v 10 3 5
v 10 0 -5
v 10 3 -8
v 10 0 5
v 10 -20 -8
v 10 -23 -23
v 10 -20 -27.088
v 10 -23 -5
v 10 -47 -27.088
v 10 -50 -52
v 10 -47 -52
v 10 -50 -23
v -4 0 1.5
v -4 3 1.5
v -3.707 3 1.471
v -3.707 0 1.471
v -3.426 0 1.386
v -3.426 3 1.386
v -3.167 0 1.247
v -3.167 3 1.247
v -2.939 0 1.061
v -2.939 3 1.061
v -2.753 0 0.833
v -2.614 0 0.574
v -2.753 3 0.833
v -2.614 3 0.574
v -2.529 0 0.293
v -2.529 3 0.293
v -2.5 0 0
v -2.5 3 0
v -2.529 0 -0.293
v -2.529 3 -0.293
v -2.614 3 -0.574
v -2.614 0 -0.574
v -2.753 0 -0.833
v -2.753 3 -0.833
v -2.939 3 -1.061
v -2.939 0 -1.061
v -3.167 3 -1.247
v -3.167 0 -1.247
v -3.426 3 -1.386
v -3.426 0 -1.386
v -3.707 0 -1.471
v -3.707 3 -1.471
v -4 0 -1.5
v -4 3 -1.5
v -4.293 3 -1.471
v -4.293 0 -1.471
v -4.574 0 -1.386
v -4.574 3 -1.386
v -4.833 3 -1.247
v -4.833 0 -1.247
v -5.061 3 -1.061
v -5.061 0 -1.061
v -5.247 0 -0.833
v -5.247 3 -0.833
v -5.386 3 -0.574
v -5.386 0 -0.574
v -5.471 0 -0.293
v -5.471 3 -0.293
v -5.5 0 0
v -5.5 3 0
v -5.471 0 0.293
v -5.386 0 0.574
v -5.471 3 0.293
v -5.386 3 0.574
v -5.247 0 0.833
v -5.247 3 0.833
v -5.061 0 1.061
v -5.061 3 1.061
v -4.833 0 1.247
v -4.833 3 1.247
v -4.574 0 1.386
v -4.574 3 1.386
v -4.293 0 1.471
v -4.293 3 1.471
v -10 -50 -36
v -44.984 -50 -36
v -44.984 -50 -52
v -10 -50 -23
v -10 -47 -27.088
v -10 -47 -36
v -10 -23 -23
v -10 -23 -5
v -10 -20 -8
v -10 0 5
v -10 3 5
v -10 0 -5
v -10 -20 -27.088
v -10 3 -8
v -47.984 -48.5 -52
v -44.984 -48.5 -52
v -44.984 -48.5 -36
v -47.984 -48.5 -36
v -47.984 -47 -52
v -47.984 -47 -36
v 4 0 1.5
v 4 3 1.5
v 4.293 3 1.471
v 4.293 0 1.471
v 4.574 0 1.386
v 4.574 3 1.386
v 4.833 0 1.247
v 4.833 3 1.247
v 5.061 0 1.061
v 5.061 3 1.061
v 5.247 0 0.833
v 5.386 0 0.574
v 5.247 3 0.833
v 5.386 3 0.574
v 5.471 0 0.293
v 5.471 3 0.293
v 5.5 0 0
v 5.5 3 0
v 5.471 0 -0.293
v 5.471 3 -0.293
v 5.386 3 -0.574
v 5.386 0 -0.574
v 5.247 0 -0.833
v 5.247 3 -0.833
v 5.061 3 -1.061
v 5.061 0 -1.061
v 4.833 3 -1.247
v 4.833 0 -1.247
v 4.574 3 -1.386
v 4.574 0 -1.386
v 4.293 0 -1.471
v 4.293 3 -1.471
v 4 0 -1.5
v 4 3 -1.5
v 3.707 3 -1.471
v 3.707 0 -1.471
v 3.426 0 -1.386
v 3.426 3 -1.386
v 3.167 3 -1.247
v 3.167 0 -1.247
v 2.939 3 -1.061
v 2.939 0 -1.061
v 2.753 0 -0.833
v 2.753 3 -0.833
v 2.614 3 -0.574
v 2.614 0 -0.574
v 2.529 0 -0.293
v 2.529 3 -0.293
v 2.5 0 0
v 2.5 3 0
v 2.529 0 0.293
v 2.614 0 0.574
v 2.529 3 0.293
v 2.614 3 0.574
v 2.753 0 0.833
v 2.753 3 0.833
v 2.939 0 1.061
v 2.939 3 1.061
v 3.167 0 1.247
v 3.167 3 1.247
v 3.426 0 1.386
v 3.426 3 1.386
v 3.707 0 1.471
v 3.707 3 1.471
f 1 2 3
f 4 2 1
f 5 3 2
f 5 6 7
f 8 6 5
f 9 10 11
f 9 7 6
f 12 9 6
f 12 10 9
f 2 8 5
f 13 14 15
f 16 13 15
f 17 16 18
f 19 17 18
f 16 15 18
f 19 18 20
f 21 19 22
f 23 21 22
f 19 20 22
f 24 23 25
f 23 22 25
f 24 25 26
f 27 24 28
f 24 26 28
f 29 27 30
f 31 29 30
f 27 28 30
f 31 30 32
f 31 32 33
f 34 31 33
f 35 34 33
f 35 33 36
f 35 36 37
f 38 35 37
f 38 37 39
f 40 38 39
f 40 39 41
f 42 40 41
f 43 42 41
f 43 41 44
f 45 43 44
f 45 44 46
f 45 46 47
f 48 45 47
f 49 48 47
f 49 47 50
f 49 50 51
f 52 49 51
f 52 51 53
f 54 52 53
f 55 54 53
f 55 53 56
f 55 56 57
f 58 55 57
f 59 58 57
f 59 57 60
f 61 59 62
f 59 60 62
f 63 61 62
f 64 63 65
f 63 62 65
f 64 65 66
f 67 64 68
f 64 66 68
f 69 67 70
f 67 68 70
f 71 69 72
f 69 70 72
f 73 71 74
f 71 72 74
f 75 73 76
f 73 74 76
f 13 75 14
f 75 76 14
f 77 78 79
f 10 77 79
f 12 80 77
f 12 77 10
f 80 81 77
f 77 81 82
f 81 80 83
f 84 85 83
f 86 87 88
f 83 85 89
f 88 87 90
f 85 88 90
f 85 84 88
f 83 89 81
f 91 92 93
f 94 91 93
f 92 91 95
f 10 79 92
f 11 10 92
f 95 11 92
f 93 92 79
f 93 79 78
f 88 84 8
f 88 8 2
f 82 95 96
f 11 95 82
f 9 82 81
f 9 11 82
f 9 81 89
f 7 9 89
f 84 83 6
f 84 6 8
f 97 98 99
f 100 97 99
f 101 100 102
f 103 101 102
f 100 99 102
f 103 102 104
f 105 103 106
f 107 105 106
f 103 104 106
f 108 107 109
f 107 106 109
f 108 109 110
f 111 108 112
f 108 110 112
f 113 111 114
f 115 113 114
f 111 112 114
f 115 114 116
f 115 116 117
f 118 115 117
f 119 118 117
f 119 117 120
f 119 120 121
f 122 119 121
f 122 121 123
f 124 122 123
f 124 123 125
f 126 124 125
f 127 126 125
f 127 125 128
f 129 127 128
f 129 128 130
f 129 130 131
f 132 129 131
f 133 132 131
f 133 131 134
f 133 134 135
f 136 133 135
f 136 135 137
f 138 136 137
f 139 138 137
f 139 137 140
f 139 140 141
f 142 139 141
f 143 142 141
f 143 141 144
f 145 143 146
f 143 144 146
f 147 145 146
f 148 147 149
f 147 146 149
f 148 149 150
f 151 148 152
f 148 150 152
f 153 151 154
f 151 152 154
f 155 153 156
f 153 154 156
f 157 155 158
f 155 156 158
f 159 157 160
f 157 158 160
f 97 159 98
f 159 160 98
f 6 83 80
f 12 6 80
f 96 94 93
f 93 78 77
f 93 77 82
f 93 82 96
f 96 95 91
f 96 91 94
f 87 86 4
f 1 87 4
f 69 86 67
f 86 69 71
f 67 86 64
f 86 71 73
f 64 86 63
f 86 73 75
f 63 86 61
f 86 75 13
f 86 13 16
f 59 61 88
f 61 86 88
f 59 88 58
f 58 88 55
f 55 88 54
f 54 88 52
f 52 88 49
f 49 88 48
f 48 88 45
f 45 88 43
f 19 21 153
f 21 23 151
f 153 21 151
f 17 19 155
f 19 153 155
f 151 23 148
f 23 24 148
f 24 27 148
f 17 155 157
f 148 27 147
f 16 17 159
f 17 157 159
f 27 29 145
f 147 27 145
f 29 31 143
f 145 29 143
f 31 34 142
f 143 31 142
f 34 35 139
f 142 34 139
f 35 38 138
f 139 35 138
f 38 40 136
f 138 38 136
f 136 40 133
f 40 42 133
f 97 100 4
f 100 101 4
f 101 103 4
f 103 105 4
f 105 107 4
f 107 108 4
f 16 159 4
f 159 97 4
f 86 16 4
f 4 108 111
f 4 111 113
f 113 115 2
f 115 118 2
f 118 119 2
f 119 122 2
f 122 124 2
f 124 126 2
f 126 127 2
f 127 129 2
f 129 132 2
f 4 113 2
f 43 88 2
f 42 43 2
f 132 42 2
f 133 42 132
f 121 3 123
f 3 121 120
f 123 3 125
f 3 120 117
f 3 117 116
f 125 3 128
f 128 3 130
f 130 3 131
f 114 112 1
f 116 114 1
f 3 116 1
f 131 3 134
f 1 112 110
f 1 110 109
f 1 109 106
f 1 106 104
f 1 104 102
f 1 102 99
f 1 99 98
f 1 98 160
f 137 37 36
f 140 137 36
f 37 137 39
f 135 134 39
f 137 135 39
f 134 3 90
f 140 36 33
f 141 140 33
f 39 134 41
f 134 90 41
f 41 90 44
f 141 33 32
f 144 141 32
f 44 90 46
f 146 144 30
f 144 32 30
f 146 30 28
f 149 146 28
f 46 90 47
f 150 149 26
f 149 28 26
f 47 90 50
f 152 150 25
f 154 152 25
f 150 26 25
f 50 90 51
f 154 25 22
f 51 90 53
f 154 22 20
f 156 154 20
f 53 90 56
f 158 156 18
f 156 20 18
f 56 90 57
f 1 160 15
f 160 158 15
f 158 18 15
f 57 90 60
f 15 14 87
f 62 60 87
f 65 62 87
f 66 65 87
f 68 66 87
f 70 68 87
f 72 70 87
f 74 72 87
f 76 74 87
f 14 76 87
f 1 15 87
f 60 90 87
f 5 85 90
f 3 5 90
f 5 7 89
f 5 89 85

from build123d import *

# Parameters (mm, degrees)
SKETCH_1_W          = 20
SKETCH_1_H          = 10
EXTRUDE_1_DEPTH     = 3
EXTRUDE_4_DEPTH     = 20
CUT_EXTRUDE_1_REACH = 71.606
SKETCH_4_R          = 1.5
SKETCH_5_W          = 55.983974596
SKETCH_5_H          = 16
EXTRUDE_5_DEPTH     = 3
SKETCH_6_W          = 16
SKETCH_6_H          = 3
CUT_EXTRUDE_2_DEPTH = 1
SKETCH_7_W          = 16
SKETCH_7_H          = 1.5
EXTRUDE_6_DEPTH     = 3


with BuildPart() as part:
    # 草图1 → 凸台-拉伸1 (new body)
    with BuildSketch(Plane(origin=(0, 0, 0), x_dir=(1, 0, 0), z_dir=(0, 1, 0))):
        Rectangle(SKETCH_1_W, SKETCH_1_H)
    extrude(amount=EXTRUDE_1_DEPTH)

    # 草图2 → 凸台-拉伸4 (add)
    with BuildSketch(Plane.ZY.offset(10)):
        Polygon((-8, -20), (-8, 3), (-5, 3), (-5, 0), (-5, -23), (-8, -23), (-23, -23), (-23, -50), (-44, -50), (-44, -47), (-27.087778499, -47), (-27.087778499, -20), align=None)
    extrude(amount=-EXTRUDE_4_DEPTH)

    # 草图4 → 切除-拉伸1 (cut, up to next)
    with BuildSketch(Plane(origin=(0, 3, 0), x_dir=(1, 0, 0), z_dir=(0, 1, 0)), mode=Mode.PRIVATE) as cut_extrude_1_sk1:
        with Locations(Location((4, 0, 0), (0, 0, 270))):
            Circle(SKETCH_4_R)
    cut_extrude_1_tool1 = extrude(cut_extrude_1_sk1.sketch, amount=-CUT_EXTRUDE_1_REACH, mode=Mode.PRIVATE) & part.part
    # 草图4 → 切除-拉伸1 (cut, up to next)
    with BuildSketch(Plane(origin=(0, 3, 0), x_dir=(1, 0, 0), z_dir=(0, 1, 0)), mode=Mode.PRIVATE) as cut_extrude_1_sk2:
        with Locations(Location((-4, 0, 0), (0, 0, 270))):
            Circle(SKETCH_4_R)
    cut_extrude_1_tool2 = extrude(cut_extrude_1_sk2.sketch, amount=-CUT_EXTRUDE_1_REACH, mode=Mode.PRIVATE) & part.part
    add(cut_extrude_1_tool1.solids().sort_by_distance((4, 3, 0))[0], mode=Mode.SUBTRACT)
    add(cut_extrude_1_tool2.solids().sort_by_distance((-4, 3, 0))[0], mode=Mode.SUBTRACT)

    # 草图5 → 凸台-拉伸5 (add)
    with BuildSketch(Plane.XZ.offset(50)):
        with Locations((-17.991987298, -44)):
            Rectangle(SKETCH_5_W, SKETCH_5_H)
    extrude(amount=-EXTRUDE_5_DEPTH)

    # 草图6 → 切除-拉伸2 (cut)
    with BuildSketch(Plane.ZY.offset(45.983974596)):
        with Locations((-44, -48.5)):
            Rectangle(SKETCH_6_W, SKETCH_6_H)
    extrude(amount=-CUT_EXTRUDE_2_DEPTH, mode=Mode.SUBTRACT)

    # 草图7 → 凸台-拉伸6 (add)
    with BuildSketch(Plane.ZY.offset(44.983974596)):
        with Locations((-44, -47.75)):
            Rectangle(SKETCH_7_W, SKETCH_7_H)
    extrude(amount=EXTRUDE_6_DEPTH)


solid = part.part
